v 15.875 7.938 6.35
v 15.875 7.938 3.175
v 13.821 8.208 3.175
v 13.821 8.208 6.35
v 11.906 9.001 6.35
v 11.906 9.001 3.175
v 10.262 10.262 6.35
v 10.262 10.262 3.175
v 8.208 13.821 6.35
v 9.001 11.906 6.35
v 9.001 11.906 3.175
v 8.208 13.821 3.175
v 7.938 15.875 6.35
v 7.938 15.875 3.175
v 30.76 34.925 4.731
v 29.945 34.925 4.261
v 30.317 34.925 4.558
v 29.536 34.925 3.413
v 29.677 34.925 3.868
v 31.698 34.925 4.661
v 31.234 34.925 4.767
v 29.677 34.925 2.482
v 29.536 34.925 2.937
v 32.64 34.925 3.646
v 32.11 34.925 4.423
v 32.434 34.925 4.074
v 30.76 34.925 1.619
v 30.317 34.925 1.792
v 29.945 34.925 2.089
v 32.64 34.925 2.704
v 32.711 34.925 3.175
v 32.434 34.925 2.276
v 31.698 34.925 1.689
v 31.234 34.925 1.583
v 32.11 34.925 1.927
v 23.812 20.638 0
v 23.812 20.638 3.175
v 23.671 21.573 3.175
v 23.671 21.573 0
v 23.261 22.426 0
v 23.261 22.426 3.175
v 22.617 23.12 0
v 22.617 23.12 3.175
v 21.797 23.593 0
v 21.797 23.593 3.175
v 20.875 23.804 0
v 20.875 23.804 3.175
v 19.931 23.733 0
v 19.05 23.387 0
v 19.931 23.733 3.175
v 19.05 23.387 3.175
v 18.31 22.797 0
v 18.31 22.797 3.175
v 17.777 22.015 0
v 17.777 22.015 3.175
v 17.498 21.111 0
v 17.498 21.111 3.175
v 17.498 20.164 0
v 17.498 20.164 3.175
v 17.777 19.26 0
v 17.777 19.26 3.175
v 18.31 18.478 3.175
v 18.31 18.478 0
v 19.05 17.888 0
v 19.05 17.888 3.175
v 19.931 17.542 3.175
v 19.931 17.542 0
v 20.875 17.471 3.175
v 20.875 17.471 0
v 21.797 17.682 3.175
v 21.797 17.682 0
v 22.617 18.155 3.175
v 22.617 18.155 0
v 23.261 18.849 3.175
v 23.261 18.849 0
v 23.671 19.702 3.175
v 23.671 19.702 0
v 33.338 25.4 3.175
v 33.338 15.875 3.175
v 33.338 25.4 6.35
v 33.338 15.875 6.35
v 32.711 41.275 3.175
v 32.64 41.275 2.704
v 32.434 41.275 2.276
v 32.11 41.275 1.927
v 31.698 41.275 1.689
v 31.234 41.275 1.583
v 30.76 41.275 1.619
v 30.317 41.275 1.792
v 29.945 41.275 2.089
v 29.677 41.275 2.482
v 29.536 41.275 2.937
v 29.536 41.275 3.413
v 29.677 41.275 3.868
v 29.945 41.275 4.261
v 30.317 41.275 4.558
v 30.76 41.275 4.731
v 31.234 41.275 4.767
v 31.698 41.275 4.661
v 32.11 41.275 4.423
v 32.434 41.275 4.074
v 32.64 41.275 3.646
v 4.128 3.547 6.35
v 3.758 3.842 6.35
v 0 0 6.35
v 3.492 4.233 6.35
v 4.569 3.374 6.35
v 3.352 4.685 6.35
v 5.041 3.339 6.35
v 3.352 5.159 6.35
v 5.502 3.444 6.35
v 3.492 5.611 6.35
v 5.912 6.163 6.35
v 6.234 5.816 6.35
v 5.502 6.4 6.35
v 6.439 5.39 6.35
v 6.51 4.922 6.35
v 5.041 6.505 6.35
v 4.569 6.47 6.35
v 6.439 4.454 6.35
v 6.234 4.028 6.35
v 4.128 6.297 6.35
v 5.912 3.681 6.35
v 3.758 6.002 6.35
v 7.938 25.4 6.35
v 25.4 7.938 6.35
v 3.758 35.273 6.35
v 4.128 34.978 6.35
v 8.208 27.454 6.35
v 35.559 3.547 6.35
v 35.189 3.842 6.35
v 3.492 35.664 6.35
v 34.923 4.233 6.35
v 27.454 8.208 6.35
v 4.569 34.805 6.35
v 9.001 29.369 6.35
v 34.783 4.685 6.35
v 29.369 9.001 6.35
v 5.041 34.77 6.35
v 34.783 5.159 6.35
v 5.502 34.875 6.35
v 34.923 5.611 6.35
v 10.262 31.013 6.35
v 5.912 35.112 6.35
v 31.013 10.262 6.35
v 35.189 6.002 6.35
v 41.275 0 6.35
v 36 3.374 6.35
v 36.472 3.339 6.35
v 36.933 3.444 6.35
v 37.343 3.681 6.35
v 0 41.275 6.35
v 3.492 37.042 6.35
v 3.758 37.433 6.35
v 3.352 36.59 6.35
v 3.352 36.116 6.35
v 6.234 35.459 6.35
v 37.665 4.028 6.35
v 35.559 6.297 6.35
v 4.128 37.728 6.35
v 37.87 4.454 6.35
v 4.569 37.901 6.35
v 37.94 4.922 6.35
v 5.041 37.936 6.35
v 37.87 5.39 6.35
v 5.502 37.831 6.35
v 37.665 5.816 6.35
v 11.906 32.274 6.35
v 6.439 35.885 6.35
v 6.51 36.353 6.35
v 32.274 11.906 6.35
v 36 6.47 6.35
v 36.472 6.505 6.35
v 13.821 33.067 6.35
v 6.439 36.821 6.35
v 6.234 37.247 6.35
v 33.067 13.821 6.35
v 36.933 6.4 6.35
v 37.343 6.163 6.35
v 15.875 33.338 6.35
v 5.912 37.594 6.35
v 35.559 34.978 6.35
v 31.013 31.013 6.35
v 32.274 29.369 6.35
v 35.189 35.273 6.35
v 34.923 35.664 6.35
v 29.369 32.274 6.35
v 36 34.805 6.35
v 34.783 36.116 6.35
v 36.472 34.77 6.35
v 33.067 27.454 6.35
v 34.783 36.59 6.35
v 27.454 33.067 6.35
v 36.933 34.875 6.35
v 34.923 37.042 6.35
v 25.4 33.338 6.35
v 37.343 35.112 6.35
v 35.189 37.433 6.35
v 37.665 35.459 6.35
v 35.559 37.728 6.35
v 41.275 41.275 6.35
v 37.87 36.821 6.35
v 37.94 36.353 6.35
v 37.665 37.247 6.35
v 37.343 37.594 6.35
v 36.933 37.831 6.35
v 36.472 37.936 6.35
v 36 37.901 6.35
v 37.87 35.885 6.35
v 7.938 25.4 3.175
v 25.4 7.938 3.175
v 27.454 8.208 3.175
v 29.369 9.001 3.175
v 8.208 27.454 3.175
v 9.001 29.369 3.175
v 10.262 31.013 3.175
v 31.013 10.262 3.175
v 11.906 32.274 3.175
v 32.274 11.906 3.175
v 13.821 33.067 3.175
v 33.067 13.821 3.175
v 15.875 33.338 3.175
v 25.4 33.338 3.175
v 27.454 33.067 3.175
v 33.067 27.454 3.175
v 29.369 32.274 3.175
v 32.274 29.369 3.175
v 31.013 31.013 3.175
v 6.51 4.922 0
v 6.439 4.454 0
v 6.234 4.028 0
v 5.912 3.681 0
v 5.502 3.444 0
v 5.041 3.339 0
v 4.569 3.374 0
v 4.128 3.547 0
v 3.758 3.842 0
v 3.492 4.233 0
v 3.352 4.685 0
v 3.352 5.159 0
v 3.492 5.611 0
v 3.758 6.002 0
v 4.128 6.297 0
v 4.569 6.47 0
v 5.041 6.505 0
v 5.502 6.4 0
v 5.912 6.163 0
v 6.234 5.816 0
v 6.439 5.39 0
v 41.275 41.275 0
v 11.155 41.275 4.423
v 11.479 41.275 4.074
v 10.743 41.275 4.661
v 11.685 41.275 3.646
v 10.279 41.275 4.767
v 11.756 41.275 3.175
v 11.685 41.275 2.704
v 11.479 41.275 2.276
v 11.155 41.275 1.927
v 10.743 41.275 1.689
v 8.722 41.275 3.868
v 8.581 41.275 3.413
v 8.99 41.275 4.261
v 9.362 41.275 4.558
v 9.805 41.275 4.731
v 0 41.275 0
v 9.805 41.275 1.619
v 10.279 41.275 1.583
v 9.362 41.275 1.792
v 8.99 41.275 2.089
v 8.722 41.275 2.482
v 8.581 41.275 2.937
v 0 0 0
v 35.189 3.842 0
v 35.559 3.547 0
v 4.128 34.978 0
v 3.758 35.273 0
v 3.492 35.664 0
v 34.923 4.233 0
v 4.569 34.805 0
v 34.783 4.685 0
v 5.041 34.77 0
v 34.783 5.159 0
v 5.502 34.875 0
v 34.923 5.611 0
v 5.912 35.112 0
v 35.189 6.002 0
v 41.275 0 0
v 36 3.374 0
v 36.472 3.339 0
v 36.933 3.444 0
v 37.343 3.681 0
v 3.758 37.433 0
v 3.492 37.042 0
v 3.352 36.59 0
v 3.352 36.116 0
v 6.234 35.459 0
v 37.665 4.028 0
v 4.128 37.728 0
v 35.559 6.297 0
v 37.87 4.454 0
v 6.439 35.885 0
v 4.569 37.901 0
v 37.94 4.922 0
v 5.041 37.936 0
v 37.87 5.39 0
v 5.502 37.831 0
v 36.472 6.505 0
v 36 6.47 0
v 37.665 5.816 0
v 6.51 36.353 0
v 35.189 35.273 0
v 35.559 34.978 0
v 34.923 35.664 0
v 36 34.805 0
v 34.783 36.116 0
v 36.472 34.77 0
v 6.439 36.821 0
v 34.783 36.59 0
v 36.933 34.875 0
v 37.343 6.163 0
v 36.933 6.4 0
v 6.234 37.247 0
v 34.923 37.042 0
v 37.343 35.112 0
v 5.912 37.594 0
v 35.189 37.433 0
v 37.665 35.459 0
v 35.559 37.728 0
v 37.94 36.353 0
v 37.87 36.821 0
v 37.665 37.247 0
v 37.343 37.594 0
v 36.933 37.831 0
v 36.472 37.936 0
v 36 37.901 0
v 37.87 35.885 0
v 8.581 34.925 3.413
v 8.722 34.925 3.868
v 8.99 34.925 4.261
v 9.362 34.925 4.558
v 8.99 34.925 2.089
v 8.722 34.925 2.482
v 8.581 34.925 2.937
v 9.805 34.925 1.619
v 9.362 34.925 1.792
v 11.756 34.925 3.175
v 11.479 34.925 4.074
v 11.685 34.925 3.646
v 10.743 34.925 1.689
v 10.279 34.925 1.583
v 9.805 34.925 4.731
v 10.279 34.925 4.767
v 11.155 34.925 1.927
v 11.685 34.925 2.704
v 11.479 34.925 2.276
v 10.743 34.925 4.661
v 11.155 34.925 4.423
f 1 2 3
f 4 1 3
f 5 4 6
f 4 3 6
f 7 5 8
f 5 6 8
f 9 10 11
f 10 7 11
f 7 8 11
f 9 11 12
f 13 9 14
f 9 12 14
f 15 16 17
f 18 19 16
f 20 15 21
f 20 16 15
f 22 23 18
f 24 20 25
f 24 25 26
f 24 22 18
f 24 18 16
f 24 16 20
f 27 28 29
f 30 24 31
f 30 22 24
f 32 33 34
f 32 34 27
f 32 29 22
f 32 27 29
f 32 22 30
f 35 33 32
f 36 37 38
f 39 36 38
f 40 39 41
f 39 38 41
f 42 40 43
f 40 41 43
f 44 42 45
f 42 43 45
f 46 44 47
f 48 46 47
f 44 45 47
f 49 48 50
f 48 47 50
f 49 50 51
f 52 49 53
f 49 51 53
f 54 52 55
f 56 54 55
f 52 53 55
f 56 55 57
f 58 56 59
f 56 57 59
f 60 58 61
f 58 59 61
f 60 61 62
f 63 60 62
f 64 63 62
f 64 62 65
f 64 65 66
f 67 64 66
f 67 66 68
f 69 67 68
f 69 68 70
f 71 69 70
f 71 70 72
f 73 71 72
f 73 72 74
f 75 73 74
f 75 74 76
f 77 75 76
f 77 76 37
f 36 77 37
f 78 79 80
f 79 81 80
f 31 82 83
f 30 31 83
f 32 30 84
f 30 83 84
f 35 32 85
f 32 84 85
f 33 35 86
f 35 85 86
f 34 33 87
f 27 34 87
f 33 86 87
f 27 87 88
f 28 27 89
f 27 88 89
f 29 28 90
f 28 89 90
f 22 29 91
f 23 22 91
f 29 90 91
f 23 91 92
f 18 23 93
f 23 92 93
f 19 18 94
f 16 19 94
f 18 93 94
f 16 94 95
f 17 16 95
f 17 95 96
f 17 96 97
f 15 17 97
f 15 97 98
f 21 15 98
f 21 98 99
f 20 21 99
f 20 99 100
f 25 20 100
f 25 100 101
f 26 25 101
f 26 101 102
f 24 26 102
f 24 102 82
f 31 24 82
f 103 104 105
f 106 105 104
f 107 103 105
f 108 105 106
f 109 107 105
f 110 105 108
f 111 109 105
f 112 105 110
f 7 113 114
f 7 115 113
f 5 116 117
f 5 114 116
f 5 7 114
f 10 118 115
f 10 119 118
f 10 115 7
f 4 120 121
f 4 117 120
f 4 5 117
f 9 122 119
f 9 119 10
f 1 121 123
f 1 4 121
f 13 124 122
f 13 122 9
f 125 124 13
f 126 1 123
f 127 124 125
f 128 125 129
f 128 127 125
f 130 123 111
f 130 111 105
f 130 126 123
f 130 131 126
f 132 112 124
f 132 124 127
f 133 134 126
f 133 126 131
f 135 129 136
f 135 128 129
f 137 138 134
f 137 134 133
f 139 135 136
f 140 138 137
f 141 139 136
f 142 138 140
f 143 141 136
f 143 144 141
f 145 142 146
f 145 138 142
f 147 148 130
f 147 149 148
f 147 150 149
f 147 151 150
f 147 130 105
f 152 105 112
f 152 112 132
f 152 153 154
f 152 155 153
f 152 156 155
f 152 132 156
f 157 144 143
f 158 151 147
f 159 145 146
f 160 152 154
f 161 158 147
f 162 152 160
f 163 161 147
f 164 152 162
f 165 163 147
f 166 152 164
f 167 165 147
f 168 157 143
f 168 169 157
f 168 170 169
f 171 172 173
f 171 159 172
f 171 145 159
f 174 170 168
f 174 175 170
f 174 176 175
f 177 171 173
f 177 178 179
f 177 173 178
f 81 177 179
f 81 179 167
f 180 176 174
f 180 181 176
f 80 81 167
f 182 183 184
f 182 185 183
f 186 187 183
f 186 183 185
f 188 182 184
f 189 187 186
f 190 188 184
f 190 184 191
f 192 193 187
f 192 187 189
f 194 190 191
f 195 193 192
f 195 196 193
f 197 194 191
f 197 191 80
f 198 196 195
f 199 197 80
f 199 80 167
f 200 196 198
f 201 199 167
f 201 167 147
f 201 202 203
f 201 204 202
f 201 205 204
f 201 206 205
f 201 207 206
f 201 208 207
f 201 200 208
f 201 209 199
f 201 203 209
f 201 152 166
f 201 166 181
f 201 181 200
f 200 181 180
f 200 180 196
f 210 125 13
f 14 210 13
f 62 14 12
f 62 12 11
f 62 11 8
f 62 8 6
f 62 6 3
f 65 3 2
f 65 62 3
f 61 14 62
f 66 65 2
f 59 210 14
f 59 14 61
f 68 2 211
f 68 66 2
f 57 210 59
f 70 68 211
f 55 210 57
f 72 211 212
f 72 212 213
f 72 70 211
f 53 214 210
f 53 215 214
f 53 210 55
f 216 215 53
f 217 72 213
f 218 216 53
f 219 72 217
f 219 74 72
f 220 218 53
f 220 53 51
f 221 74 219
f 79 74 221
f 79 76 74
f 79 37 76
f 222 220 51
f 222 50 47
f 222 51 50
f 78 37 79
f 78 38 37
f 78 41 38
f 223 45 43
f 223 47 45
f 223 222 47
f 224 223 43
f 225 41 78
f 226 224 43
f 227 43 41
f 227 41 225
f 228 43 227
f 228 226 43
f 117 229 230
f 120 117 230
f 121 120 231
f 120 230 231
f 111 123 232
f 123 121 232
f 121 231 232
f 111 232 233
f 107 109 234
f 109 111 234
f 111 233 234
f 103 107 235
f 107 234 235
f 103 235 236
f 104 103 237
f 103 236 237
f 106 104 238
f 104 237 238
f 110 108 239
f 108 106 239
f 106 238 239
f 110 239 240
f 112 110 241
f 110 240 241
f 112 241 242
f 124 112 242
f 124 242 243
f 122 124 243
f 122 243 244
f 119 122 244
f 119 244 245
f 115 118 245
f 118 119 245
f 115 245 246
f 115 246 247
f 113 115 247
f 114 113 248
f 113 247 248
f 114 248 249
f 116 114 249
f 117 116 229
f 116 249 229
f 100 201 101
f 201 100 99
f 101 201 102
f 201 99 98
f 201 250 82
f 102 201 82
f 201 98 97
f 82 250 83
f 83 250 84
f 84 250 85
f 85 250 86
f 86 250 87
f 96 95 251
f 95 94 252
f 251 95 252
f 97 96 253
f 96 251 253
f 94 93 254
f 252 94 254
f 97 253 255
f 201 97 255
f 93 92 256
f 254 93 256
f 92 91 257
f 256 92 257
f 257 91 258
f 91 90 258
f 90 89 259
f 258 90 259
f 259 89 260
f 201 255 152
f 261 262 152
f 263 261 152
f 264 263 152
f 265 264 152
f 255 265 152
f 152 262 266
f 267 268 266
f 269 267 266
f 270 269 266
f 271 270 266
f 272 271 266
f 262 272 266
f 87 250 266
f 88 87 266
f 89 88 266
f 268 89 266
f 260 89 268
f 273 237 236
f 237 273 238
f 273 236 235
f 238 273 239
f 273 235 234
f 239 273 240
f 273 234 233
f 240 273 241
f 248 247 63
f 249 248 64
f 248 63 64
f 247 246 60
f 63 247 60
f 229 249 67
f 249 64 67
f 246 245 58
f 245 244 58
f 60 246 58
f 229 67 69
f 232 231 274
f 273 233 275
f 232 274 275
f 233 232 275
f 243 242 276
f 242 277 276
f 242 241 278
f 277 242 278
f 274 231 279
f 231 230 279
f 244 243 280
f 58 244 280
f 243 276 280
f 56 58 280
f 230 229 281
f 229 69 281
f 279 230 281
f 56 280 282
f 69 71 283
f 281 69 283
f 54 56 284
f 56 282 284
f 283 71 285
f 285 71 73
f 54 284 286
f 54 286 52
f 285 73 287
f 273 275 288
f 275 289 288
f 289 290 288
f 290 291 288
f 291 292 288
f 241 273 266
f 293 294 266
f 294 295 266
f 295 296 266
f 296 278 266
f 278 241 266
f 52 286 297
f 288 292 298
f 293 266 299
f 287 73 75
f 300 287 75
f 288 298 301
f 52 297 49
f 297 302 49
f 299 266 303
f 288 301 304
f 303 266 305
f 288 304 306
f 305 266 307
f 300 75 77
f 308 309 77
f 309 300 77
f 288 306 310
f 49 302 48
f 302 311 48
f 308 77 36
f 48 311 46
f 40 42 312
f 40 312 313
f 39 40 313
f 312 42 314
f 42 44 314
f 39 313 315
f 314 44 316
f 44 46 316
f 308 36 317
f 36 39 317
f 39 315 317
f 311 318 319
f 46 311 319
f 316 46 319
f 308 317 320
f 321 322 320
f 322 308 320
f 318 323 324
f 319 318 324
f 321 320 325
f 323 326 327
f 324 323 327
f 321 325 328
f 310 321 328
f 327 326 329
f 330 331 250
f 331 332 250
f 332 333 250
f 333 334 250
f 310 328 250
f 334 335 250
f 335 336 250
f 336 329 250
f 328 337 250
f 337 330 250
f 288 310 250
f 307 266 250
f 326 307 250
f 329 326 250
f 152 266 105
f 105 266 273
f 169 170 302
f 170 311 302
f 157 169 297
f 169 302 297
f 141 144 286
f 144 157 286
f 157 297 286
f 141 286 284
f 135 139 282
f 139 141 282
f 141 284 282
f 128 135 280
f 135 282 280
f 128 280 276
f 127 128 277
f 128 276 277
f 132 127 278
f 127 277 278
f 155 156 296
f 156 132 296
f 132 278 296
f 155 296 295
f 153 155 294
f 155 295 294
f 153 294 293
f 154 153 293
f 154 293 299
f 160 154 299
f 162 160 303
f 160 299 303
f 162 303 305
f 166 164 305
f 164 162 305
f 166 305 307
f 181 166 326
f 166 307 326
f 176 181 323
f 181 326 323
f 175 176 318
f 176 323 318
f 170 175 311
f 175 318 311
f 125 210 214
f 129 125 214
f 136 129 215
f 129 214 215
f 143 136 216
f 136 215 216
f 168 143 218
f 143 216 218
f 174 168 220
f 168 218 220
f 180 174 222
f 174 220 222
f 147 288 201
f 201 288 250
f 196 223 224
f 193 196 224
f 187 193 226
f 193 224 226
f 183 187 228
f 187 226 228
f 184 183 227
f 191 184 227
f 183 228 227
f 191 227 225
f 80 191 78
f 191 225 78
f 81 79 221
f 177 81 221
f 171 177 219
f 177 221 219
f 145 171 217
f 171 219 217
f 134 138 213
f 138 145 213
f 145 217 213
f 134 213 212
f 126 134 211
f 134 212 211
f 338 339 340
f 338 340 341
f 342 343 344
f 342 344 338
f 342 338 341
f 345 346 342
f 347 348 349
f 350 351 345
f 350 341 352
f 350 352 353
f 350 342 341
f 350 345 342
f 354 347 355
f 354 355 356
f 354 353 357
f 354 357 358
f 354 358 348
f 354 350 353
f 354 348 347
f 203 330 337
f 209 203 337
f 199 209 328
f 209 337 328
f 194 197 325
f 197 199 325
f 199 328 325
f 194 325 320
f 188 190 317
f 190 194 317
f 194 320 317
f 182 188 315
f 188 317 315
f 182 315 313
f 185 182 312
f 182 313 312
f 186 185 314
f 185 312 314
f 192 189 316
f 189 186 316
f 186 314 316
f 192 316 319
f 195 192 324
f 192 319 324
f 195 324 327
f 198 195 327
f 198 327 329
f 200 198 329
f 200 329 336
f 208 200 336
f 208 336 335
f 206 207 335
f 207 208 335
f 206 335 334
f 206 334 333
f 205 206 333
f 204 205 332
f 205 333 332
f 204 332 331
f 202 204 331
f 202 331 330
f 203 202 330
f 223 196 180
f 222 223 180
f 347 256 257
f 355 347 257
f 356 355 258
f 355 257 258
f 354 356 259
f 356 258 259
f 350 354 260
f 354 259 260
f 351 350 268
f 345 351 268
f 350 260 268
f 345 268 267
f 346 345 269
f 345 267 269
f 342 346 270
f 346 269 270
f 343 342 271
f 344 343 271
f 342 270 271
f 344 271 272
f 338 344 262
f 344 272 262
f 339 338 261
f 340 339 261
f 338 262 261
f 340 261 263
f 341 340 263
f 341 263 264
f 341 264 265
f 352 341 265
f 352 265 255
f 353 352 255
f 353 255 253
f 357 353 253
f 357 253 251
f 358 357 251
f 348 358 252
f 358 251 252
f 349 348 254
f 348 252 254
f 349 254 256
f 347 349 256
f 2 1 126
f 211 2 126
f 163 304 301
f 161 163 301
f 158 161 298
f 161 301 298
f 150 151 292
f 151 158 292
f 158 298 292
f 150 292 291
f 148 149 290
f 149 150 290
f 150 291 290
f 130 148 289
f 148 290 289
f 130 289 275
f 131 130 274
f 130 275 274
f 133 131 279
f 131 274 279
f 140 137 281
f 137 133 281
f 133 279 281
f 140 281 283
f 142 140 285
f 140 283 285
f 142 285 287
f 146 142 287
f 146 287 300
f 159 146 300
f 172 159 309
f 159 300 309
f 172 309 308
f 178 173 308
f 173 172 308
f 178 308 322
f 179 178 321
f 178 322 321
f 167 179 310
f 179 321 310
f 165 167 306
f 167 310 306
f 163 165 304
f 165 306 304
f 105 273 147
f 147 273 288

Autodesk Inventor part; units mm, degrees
ref_plane "YZ Plane" through (0, 0, 0) normal (1, 0, 0) x (0, 1, 0)
ref_plane "XZ Plane" through (0, 0, 0) normal (0, 1, 0) x (-1, 0, 0)
ref_plane "XY Plane" through (0, 0, 0) normal (0, 0, 1) x (1, 0, 0)
sketch "Sketch1" plane through (0, 0, 0) normal (0, 0, 1) x (1, 0, 0)
  line L0 (0, 0) -> (41.275, 0)
  line L1 (41.275, 0) -> (41.275, 41.275)
  line L2 (41.275, 41.275) -> (0, 41.275)
  line L3 (0, 41.275) -> (0, 0)
  circle A0 centre (20.6375, 20.6375) radius 22.225 construction
  line L4 (0, 0) -> (41.275, 41.275) construction
  line L5 (0, 41.275) -> (41.275, 0) construction
  circle A1 centre (4.9221, 36.3529) radius 1.5875
  circle A2 centre (4.9221, 4.9221) radius 1.5875
  circle A3 centre (36.3529, 36.3529) radius 1.5875
  circle A4 centre (36.3529, 4.9221) radius 1.5875
  dimension "d0" = 41.275
  dimension "d2" = 41.275
  dimension "d3" = 44.45
  dimension "d4" = 3.175
  dimension "d5" = 3.175
  dimension "d6" = 3.175
  dimension "d7" = 3.175
  dimension "d8" = 20.6375
  dimension "d9" = 20.6375
extrude "Extrusion1" add sketch "Sketch1" along normal blind 6.35
sketch "Sketch2" plane through (0, 41.275, 0) normal (0, 1, 0) x (1, 0, 0)
  line L0 (41.275, 0) -> (0, 0) projected
  line L1 (0, 0) -> (0, -6.35) projected
  line L2 (41.275, 0) -> (41.275, -6.35) projected
  circle A0 centre (10.16, -3.175) radius 1.5964
  circle A1 centre (31.115, -3.175) radius 1.5964
  dimension "d12" = 3.1928
  dimension "d14" = 3.1928
  dimension "d15" = 10.16
  dimension "d17" = 10.16
  dimension "d18" = 3.175
  dimension "d19" = 3.175
extrude "Extrusion2" cut sketch "Sketch2" against normal blind 6.35
sketch "Sketch3" plane through (0, 0, 6.35) normal (0, 0, 1) x (1, 0, 0)
  line L0 (7.9375, 7.9375) -> (33.3375, 7.9375)
  line L1 (33.3375, 7.9375) -> (33.3375, 33.3375)
  line L2 (33.3375, 33.3375) -> (7.9375, 33.3375)
  line L3 (7.9375, 33.3375) -> (7.9375, 7.9375)
extrude "Extrusion3" cut sketch "Sketch3" against normal blind 3.175
fillet "Fillet1" radius 7.9375 1 edges at (7.9375, 33.3375, 4.7625)
fillet "Fillet2" radius 7.9375 3 edges at (7.9375, 7.9375, 4.7625) (33.3375, 7.9375, 4.7625) (33.3375, 33.3375, 4.7625)
sketch "Sketch4" plane through (0, 0, 3.175) normal (0, 0, 1) x (1, 0, 0)
  circle A0 centre (20.6375, 20.6375) radius 3.175
  point P0 (0, 0)
  dimension "d33" = 6.35
extrude "Extrusion4" cut sketch "Sketch4" against normal blind 25.4
properties part number "motor_mount"
